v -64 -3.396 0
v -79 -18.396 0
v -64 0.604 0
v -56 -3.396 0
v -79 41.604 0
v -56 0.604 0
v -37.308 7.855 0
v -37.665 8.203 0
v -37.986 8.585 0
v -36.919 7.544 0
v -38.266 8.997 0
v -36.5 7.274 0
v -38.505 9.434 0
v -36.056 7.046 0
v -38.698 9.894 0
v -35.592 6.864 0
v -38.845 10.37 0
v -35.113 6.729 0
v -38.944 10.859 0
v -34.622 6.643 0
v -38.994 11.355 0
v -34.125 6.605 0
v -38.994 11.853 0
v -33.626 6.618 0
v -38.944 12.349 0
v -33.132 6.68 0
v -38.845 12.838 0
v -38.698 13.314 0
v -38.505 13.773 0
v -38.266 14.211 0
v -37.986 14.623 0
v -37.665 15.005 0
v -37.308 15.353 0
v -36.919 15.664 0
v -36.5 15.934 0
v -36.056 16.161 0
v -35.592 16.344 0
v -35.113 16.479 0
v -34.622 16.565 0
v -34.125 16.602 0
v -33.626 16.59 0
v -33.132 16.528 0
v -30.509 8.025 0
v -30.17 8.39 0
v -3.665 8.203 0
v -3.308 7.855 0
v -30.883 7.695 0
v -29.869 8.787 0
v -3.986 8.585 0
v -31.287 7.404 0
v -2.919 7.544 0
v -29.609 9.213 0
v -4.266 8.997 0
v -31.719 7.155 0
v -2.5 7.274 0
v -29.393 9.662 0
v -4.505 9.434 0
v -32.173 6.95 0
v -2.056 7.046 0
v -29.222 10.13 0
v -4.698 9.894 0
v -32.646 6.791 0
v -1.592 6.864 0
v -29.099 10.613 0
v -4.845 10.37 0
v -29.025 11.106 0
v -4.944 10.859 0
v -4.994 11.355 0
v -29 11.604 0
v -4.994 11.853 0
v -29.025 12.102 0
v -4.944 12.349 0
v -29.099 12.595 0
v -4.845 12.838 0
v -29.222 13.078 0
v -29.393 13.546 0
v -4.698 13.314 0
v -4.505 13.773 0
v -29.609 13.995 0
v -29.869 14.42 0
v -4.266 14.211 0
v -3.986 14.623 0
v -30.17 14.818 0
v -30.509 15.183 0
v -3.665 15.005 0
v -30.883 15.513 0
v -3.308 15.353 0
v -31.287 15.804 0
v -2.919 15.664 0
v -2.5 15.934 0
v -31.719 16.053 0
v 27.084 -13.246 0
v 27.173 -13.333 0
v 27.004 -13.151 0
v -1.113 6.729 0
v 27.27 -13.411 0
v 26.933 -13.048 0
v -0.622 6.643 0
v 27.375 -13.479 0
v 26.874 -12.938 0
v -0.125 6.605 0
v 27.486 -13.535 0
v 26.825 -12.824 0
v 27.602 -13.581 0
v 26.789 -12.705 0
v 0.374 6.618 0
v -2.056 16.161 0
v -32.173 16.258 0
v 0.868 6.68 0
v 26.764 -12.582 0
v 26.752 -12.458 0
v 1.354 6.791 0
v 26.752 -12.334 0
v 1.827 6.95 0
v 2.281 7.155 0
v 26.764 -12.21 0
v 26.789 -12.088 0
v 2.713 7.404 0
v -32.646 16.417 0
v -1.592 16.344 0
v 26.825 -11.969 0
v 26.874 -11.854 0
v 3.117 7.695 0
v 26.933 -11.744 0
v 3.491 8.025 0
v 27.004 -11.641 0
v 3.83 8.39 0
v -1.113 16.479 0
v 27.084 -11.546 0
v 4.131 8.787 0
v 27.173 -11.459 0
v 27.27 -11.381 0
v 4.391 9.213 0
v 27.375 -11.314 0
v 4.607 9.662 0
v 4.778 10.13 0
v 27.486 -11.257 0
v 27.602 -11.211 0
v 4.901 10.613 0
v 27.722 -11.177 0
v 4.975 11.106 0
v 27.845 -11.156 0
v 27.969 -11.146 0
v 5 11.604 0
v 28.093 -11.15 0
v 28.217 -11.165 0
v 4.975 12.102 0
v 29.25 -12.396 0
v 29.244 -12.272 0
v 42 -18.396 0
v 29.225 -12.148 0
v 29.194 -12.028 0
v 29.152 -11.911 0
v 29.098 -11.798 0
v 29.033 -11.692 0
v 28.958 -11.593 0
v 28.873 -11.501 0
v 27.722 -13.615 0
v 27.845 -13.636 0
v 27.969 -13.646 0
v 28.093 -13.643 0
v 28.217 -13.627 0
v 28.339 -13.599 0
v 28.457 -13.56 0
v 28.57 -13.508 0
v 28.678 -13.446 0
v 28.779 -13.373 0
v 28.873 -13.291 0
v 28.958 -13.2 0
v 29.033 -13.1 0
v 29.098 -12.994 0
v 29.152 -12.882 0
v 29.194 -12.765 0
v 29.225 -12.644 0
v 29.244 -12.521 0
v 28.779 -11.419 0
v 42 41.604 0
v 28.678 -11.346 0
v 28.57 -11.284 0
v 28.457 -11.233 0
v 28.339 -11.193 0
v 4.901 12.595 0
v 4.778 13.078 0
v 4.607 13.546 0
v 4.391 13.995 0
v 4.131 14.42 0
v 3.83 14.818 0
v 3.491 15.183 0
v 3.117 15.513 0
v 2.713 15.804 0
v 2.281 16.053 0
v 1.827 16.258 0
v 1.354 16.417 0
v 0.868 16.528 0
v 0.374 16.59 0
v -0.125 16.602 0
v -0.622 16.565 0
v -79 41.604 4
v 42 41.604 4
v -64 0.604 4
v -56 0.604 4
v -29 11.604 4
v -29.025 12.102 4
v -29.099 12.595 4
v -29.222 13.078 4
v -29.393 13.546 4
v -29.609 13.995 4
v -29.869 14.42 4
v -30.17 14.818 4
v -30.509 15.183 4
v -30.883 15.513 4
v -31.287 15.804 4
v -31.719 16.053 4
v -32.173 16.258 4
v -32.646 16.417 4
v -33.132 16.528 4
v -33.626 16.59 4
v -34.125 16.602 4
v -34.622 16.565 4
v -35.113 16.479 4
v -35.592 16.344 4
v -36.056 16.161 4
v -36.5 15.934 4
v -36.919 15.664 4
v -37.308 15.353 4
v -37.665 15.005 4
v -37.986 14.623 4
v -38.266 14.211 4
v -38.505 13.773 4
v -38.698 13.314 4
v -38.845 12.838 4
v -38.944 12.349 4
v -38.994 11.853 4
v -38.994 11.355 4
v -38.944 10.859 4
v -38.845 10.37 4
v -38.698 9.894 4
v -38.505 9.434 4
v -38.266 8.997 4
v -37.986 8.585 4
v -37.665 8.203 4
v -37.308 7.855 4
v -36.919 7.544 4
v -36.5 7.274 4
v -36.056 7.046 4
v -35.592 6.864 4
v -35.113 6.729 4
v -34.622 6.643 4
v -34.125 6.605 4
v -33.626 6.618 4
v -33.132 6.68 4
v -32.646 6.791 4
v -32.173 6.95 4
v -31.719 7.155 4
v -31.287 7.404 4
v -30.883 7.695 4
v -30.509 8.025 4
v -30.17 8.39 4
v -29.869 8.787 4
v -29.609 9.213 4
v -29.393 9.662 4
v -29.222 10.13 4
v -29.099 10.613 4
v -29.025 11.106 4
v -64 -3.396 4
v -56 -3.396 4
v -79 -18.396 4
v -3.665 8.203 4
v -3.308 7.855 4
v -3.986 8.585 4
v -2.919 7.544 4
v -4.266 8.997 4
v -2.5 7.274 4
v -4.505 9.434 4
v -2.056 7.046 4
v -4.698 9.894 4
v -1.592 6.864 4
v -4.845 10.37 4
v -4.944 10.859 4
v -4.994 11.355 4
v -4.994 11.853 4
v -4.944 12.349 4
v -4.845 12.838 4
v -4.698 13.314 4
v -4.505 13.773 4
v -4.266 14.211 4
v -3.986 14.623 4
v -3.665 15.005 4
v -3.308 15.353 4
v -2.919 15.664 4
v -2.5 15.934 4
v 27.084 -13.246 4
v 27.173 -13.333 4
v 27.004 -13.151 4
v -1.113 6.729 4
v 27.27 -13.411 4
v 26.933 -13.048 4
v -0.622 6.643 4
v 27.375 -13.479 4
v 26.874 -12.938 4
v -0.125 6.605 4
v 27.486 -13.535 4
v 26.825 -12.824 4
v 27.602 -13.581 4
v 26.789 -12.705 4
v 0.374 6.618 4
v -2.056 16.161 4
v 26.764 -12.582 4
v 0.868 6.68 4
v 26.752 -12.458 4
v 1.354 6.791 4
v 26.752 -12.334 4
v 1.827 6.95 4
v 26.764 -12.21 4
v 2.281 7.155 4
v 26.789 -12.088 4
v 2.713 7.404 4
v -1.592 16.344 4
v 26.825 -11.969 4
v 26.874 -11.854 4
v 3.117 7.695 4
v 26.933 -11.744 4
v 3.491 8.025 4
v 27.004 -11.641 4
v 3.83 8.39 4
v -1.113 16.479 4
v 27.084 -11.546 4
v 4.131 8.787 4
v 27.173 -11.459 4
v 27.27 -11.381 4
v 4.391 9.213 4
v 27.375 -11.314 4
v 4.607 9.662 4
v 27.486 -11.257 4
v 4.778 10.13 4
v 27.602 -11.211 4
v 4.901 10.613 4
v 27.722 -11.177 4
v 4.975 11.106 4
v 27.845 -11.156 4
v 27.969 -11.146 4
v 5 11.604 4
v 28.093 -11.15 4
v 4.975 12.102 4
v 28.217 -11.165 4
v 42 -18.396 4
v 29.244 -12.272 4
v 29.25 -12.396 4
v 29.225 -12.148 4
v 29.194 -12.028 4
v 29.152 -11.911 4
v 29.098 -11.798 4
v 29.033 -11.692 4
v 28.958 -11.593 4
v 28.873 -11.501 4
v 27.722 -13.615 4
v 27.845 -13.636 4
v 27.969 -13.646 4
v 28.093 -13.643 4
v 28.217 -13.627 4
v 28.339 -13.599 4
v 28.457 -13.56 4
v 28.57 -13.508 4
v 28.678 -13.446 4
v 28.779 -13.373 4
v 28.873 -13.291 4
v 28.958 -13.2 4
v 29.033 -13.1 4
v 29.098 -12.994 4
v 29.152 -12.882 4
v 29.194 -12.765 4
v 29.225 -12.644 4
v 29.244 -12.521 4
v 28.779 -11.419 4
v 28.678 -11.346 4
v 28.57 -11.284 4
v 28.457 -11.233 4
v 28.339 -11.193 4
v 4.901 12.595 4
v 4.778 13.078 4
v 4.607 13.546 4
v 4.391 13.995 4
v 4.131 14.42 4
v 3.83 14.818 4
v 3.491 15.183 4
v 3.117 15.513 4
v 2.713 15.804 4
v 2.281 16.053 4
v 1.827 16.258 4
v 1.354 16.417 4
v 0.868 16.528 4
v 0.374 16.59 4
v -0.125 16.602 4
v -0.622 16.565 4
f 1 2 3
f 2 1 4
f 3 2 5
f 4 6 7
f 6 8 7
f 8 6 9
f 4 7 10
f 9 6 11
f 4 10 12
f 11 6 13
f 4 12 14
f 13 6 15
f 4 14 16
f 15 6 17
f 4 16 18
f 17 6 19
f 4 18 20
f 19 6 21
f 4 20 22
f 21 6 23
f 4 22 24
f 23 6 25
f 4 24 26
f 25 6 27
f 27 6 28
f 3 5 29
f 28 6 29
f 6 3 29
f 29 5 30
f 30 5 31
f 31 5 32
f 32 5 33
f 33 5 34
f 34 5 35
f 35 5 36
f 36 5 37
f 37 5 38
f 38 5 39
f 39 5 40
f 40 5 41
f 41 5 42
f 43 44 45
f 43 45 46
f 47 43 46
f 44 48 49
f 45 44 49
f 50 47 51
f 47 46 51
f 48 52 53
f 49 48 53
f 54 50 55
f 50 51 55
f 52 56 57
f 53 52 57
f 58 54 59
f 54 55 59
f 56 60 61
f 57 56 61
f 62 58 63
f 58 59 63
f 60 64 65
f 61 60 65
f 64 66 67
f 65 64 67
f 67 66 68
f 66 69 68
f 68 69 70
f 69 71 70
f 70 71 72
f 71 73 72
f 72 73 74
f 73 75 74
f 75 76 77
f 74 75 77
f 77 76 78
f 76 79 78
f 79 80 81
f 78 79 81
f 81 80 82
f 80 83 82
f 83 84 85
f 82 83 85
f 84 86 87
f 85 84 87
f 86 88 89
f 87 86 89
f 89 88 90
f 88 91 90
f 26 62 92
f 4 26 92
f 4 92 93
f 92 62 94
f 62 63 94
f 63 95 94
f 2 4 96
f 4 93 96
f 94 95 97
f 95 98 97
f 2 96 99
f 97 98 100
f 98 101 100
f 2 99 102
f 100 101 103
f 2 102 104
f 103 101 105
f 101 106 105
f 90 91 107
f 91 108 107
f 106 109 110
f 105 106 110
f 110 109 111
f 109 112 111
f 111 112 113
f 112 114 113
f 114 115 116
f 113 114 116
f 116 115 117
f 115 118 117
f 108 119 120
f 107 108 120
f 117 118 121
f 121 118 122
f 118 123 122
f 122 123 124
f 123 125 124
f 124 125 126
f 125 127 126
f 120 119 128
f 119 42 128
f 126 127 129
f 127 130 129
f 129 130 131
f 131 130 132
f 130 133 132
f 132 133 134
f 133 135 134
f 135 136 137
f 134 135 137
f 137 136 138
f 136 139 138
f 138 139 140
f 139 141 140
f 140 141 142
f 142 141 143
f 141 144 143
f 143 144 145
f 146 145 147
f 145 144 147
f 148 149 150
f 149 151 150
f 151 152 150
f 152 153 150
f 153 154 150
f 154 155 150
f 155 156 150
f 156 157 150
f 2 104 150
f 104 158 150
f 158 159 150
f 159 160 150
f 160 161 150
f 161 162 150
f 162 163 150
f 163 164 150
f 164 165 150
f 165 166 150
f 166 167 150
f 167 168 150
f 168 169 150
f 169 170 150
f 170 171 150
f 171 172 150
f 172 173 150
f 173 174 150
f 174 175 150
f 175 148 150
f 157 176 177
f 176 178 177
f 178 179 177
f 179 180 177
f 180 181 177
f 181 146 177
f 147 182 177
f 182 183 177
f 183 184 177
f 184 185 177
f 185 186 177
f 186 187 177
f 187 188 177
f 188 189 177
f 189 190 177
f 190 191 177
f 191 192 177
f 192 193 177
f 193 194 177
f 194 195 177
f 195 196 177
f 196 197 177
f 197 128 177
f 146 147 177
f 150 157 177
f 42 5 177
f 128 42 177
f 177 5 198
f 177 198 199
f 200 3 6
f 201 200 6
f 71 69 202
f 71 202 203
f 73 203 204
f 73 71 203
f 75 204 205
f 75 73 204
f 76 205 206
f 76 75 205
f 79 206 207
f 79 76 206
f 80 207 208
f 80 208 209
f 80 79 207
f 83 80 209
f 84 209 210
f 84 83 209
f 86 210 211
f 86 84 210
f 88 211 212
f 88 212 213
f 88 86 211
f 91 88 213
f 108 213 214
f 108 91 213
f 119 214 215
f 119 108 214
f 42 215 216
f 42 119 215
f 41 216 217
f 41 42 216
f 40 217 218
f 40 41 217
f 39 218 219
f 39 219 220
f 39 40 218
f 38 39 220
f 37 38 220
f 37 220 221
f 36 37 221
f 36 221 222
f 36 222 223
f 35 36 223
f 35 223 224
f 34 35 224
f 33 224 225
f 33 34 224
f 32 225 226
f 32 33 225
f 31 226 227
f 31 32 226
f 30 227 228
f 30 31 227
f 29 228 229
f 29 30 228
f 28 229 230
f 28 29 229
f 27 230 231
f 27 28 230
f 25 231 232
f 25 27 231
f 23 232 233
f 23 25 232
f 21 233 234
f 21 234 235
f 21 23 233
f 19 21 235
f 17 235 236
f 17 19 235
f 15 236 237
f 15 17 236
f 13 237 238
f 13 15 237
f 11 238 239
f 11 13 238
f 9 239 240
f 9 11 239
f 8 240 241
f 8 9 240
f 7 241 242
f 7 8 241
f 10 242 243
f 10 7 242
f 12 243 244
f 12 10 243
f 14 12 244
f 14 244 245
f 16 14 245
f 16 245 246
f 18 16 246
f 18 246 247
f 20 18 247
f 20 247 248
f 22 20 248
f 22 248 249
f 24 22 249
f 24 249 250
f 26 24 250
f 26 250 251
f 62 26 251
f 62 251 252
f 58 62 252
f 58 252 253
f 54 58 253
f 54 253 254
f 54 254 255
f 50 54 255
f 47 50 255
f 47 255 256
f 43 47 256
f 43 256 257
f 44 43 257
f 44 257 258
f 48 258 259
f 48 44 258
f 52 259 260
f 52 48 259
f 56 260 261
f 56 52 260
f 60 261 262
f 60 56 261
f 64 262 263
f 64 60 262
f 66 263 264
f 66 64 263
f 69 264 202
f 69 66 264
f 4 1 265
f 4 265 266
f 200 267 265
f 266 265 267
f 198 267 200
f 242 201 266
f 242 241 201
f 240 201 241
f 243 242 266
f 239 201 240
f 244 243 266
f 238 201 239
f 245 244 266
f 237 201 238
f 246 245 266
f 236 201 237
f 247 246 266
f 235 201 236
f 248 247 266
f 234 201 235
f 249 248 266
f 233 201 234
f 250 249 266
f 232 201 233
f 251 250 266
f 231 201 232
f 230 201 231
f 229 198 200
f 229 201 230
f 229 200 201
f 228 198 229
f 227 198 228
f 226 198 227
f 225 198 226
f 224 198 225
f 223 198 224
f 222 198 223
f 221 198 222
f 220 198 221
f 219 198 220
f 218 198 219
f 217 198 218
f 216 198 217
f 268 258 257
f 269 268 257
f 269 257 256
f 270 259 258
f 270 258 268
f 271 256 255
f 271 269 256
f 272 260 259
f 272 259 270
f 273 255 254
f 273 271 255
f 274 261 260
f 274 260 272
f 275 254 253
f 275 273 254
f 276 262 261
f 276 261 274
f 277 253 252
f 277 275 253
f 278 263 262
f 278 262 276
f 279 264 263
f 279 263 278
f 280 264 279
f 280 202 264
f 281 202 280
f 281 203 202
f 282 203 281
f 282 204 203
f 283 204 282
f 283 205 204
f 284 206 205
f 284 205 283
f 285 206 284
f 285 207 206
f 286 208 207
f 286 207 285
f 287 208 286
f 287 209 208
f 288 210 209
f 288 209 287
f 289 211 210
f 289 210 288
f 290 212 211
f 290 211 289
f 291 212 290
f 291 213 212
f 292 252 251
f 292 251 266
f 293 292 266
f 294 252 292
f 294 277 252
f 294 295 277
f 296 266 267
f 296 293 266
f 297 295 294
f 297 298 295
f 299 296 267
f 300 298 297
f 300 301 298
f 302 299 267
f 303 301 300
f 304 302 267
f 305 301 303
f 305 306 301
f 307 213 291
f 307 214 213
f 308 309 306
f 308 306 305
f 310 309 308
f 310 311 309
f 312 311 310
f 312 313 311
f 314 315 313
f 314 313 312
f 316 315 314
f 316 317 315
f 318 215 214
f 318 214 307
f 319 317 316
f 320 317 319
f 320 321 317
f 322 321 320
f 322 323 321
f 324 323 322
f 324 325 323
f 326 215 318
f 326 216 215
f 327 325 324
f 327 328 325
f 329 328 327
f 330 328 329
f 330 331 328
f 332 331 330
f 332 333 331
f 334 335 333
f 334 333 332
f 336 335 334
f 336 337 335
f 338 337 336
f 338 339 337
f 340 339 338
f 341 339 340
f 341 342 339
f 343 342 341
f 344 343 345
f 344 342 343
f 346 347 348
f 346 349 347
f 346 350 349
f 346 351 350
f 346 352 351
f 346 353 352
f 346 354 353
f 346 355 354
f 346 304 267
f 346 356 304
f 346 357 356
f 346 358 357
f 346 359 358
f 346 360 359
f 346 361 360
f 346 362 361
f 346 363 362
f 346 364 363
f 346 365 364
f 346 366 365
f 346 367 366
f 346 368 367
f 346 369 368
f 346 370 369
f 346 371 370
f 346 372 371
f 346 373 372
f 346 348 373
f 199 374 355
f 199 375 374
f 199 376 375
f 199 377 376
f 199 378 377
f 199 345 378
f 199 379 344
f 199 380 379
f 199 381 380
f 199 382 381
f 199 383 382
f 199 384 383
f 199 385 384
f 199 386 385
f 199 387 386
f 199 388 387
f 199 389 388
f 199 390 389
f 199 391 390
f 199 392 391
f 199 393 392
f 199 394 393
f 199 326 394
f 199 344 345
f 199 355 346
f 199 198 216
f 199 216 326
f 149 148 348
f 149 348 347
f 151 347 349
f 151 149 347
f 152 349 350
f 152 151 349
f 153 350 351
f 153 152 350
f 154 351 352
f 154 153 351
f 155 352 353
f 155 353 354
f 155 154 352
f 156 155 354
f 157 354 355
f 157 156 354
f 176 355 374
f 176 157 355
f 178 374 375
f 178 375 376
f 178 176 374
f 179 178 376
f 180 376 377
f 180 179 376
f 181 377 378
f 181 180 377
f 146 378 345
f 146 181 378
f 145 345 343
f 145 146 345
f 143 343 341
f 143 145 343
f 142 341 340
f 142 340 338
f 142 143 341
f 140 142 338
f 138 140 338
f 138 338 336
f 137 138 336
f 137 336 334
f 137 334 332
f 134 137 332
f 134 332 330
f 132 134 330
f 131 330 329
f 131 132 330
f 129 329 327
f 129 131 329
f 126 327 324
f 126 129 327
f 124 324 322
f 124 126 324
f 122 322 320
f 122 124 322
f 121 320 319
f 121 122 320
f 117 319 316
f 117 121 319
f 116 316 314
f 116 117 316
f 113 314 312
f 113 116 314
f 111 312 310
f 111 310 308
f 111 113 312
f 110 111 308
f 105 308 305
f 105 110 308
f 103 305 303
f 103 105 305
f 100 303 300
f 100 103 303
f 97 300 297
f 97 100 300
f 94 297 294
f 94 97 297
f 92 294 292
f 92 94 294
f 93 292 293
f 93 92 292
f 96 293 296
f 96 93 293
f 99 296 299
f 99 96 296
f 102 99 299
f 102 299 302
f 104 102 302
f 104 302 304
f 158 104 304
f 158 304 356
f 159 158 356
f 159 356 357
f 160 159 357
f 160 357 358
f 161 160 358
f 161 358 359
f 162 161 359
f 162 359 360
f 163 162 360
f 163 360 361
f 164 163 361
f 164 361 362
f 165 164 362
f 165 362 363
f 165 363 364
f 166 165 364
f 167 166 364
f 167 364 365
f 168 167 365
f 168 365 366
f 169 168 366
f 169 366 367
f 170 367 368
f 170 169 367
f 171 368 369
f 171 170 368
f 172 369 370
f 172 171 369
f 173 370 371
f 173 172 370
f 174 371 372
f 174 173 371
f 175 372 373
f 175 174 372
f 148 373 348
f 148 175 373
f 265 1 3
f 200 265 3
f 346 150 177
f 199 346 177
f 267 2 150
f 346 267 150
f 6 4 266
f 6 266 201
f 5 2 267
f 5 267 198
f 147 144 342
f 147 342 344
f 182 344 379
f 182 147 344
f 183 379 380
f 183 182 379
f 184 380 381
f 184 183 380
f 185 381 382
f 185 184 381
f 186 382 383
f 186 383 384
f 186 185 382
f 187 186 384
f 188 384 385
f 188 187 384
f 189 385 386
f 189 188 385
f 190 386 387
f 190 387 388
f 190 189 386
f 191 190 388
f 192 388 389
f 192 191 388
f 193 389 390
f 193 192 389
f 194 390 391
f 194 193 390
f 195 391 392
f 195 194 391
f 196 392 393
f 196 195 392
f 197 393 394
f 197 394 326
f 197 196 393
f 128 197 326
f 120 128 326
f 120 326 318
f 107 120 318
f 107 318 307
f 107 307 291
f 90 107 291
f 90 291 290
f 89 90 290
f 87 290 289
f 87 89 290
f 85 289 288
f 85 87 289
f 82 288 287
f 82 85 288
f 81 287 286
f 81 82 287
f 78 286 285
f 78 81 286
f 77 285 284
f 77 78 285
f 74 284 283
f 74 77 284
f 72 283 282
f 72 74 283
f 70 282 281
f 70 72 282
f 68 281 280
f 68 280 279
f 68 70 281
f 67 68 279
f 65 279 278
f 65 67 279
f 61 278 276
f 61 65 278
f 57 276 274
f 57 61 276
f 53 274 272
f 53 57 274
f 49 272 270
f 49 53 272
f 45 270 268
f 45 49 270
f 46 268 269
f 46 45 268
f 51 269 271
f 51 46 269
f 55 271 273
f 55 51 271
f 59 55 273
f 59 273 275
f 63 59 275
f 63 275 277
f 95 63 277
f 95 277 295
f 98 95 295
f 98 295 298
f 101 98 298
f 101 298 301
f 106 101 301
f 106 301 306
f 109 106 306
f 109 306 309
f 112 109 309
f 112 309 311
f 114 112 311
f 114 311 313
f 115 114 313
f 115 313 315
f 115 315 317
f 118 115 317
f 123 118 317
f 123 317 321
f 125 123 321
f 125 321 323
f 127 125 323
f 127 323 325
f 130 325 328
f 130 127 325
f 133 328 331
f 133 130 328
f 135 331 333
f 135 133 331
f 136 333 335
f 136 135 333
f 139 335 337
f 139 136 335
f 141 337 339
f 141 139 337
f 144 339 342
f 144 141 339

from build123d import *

# Parameters (mm, degrees)
SKETCH1_W           = 121
SKETCH1_H           = 60
SKETCH1_R           = 5
SKETCH1_R_2         = 1.25
SKETCH1_W_2         = 8
SKETCH1_H_2         = 4
BOSS_EXTRUDE1_DEPTH = 4


with BuildPart() as part:
    # Sketch1 → Boss-Extrude1 (new body)
    with BuildSketch(Plane.XY):
        with Locations((-18.5, 11.603893248)):
            Rectangle(SKETCH1_W, SKETCH1_H)
        with Locations((-34, 11.603893248)):
            Circle(SKETCH1_R, mode=Mode.SUBTRACT)
        with Locations((0, 11.603893248)):
            Circle(SKETCH1_R, mode=Mode.SUBTRACT)
        with Locations((28, -12.396106752)):
            Circle(SKETCH1_R_2, mode=Mode.SUBTRACT)
        with Locations((-60, -1.396106752)):
            Rectangle(SKETCH1_W_2, SKETCH1_H_2, mode=Mode.SUBTRACT)
    extrude(amount=BOSS_EXTRUDE1_DEPTH)


solid = part.part
